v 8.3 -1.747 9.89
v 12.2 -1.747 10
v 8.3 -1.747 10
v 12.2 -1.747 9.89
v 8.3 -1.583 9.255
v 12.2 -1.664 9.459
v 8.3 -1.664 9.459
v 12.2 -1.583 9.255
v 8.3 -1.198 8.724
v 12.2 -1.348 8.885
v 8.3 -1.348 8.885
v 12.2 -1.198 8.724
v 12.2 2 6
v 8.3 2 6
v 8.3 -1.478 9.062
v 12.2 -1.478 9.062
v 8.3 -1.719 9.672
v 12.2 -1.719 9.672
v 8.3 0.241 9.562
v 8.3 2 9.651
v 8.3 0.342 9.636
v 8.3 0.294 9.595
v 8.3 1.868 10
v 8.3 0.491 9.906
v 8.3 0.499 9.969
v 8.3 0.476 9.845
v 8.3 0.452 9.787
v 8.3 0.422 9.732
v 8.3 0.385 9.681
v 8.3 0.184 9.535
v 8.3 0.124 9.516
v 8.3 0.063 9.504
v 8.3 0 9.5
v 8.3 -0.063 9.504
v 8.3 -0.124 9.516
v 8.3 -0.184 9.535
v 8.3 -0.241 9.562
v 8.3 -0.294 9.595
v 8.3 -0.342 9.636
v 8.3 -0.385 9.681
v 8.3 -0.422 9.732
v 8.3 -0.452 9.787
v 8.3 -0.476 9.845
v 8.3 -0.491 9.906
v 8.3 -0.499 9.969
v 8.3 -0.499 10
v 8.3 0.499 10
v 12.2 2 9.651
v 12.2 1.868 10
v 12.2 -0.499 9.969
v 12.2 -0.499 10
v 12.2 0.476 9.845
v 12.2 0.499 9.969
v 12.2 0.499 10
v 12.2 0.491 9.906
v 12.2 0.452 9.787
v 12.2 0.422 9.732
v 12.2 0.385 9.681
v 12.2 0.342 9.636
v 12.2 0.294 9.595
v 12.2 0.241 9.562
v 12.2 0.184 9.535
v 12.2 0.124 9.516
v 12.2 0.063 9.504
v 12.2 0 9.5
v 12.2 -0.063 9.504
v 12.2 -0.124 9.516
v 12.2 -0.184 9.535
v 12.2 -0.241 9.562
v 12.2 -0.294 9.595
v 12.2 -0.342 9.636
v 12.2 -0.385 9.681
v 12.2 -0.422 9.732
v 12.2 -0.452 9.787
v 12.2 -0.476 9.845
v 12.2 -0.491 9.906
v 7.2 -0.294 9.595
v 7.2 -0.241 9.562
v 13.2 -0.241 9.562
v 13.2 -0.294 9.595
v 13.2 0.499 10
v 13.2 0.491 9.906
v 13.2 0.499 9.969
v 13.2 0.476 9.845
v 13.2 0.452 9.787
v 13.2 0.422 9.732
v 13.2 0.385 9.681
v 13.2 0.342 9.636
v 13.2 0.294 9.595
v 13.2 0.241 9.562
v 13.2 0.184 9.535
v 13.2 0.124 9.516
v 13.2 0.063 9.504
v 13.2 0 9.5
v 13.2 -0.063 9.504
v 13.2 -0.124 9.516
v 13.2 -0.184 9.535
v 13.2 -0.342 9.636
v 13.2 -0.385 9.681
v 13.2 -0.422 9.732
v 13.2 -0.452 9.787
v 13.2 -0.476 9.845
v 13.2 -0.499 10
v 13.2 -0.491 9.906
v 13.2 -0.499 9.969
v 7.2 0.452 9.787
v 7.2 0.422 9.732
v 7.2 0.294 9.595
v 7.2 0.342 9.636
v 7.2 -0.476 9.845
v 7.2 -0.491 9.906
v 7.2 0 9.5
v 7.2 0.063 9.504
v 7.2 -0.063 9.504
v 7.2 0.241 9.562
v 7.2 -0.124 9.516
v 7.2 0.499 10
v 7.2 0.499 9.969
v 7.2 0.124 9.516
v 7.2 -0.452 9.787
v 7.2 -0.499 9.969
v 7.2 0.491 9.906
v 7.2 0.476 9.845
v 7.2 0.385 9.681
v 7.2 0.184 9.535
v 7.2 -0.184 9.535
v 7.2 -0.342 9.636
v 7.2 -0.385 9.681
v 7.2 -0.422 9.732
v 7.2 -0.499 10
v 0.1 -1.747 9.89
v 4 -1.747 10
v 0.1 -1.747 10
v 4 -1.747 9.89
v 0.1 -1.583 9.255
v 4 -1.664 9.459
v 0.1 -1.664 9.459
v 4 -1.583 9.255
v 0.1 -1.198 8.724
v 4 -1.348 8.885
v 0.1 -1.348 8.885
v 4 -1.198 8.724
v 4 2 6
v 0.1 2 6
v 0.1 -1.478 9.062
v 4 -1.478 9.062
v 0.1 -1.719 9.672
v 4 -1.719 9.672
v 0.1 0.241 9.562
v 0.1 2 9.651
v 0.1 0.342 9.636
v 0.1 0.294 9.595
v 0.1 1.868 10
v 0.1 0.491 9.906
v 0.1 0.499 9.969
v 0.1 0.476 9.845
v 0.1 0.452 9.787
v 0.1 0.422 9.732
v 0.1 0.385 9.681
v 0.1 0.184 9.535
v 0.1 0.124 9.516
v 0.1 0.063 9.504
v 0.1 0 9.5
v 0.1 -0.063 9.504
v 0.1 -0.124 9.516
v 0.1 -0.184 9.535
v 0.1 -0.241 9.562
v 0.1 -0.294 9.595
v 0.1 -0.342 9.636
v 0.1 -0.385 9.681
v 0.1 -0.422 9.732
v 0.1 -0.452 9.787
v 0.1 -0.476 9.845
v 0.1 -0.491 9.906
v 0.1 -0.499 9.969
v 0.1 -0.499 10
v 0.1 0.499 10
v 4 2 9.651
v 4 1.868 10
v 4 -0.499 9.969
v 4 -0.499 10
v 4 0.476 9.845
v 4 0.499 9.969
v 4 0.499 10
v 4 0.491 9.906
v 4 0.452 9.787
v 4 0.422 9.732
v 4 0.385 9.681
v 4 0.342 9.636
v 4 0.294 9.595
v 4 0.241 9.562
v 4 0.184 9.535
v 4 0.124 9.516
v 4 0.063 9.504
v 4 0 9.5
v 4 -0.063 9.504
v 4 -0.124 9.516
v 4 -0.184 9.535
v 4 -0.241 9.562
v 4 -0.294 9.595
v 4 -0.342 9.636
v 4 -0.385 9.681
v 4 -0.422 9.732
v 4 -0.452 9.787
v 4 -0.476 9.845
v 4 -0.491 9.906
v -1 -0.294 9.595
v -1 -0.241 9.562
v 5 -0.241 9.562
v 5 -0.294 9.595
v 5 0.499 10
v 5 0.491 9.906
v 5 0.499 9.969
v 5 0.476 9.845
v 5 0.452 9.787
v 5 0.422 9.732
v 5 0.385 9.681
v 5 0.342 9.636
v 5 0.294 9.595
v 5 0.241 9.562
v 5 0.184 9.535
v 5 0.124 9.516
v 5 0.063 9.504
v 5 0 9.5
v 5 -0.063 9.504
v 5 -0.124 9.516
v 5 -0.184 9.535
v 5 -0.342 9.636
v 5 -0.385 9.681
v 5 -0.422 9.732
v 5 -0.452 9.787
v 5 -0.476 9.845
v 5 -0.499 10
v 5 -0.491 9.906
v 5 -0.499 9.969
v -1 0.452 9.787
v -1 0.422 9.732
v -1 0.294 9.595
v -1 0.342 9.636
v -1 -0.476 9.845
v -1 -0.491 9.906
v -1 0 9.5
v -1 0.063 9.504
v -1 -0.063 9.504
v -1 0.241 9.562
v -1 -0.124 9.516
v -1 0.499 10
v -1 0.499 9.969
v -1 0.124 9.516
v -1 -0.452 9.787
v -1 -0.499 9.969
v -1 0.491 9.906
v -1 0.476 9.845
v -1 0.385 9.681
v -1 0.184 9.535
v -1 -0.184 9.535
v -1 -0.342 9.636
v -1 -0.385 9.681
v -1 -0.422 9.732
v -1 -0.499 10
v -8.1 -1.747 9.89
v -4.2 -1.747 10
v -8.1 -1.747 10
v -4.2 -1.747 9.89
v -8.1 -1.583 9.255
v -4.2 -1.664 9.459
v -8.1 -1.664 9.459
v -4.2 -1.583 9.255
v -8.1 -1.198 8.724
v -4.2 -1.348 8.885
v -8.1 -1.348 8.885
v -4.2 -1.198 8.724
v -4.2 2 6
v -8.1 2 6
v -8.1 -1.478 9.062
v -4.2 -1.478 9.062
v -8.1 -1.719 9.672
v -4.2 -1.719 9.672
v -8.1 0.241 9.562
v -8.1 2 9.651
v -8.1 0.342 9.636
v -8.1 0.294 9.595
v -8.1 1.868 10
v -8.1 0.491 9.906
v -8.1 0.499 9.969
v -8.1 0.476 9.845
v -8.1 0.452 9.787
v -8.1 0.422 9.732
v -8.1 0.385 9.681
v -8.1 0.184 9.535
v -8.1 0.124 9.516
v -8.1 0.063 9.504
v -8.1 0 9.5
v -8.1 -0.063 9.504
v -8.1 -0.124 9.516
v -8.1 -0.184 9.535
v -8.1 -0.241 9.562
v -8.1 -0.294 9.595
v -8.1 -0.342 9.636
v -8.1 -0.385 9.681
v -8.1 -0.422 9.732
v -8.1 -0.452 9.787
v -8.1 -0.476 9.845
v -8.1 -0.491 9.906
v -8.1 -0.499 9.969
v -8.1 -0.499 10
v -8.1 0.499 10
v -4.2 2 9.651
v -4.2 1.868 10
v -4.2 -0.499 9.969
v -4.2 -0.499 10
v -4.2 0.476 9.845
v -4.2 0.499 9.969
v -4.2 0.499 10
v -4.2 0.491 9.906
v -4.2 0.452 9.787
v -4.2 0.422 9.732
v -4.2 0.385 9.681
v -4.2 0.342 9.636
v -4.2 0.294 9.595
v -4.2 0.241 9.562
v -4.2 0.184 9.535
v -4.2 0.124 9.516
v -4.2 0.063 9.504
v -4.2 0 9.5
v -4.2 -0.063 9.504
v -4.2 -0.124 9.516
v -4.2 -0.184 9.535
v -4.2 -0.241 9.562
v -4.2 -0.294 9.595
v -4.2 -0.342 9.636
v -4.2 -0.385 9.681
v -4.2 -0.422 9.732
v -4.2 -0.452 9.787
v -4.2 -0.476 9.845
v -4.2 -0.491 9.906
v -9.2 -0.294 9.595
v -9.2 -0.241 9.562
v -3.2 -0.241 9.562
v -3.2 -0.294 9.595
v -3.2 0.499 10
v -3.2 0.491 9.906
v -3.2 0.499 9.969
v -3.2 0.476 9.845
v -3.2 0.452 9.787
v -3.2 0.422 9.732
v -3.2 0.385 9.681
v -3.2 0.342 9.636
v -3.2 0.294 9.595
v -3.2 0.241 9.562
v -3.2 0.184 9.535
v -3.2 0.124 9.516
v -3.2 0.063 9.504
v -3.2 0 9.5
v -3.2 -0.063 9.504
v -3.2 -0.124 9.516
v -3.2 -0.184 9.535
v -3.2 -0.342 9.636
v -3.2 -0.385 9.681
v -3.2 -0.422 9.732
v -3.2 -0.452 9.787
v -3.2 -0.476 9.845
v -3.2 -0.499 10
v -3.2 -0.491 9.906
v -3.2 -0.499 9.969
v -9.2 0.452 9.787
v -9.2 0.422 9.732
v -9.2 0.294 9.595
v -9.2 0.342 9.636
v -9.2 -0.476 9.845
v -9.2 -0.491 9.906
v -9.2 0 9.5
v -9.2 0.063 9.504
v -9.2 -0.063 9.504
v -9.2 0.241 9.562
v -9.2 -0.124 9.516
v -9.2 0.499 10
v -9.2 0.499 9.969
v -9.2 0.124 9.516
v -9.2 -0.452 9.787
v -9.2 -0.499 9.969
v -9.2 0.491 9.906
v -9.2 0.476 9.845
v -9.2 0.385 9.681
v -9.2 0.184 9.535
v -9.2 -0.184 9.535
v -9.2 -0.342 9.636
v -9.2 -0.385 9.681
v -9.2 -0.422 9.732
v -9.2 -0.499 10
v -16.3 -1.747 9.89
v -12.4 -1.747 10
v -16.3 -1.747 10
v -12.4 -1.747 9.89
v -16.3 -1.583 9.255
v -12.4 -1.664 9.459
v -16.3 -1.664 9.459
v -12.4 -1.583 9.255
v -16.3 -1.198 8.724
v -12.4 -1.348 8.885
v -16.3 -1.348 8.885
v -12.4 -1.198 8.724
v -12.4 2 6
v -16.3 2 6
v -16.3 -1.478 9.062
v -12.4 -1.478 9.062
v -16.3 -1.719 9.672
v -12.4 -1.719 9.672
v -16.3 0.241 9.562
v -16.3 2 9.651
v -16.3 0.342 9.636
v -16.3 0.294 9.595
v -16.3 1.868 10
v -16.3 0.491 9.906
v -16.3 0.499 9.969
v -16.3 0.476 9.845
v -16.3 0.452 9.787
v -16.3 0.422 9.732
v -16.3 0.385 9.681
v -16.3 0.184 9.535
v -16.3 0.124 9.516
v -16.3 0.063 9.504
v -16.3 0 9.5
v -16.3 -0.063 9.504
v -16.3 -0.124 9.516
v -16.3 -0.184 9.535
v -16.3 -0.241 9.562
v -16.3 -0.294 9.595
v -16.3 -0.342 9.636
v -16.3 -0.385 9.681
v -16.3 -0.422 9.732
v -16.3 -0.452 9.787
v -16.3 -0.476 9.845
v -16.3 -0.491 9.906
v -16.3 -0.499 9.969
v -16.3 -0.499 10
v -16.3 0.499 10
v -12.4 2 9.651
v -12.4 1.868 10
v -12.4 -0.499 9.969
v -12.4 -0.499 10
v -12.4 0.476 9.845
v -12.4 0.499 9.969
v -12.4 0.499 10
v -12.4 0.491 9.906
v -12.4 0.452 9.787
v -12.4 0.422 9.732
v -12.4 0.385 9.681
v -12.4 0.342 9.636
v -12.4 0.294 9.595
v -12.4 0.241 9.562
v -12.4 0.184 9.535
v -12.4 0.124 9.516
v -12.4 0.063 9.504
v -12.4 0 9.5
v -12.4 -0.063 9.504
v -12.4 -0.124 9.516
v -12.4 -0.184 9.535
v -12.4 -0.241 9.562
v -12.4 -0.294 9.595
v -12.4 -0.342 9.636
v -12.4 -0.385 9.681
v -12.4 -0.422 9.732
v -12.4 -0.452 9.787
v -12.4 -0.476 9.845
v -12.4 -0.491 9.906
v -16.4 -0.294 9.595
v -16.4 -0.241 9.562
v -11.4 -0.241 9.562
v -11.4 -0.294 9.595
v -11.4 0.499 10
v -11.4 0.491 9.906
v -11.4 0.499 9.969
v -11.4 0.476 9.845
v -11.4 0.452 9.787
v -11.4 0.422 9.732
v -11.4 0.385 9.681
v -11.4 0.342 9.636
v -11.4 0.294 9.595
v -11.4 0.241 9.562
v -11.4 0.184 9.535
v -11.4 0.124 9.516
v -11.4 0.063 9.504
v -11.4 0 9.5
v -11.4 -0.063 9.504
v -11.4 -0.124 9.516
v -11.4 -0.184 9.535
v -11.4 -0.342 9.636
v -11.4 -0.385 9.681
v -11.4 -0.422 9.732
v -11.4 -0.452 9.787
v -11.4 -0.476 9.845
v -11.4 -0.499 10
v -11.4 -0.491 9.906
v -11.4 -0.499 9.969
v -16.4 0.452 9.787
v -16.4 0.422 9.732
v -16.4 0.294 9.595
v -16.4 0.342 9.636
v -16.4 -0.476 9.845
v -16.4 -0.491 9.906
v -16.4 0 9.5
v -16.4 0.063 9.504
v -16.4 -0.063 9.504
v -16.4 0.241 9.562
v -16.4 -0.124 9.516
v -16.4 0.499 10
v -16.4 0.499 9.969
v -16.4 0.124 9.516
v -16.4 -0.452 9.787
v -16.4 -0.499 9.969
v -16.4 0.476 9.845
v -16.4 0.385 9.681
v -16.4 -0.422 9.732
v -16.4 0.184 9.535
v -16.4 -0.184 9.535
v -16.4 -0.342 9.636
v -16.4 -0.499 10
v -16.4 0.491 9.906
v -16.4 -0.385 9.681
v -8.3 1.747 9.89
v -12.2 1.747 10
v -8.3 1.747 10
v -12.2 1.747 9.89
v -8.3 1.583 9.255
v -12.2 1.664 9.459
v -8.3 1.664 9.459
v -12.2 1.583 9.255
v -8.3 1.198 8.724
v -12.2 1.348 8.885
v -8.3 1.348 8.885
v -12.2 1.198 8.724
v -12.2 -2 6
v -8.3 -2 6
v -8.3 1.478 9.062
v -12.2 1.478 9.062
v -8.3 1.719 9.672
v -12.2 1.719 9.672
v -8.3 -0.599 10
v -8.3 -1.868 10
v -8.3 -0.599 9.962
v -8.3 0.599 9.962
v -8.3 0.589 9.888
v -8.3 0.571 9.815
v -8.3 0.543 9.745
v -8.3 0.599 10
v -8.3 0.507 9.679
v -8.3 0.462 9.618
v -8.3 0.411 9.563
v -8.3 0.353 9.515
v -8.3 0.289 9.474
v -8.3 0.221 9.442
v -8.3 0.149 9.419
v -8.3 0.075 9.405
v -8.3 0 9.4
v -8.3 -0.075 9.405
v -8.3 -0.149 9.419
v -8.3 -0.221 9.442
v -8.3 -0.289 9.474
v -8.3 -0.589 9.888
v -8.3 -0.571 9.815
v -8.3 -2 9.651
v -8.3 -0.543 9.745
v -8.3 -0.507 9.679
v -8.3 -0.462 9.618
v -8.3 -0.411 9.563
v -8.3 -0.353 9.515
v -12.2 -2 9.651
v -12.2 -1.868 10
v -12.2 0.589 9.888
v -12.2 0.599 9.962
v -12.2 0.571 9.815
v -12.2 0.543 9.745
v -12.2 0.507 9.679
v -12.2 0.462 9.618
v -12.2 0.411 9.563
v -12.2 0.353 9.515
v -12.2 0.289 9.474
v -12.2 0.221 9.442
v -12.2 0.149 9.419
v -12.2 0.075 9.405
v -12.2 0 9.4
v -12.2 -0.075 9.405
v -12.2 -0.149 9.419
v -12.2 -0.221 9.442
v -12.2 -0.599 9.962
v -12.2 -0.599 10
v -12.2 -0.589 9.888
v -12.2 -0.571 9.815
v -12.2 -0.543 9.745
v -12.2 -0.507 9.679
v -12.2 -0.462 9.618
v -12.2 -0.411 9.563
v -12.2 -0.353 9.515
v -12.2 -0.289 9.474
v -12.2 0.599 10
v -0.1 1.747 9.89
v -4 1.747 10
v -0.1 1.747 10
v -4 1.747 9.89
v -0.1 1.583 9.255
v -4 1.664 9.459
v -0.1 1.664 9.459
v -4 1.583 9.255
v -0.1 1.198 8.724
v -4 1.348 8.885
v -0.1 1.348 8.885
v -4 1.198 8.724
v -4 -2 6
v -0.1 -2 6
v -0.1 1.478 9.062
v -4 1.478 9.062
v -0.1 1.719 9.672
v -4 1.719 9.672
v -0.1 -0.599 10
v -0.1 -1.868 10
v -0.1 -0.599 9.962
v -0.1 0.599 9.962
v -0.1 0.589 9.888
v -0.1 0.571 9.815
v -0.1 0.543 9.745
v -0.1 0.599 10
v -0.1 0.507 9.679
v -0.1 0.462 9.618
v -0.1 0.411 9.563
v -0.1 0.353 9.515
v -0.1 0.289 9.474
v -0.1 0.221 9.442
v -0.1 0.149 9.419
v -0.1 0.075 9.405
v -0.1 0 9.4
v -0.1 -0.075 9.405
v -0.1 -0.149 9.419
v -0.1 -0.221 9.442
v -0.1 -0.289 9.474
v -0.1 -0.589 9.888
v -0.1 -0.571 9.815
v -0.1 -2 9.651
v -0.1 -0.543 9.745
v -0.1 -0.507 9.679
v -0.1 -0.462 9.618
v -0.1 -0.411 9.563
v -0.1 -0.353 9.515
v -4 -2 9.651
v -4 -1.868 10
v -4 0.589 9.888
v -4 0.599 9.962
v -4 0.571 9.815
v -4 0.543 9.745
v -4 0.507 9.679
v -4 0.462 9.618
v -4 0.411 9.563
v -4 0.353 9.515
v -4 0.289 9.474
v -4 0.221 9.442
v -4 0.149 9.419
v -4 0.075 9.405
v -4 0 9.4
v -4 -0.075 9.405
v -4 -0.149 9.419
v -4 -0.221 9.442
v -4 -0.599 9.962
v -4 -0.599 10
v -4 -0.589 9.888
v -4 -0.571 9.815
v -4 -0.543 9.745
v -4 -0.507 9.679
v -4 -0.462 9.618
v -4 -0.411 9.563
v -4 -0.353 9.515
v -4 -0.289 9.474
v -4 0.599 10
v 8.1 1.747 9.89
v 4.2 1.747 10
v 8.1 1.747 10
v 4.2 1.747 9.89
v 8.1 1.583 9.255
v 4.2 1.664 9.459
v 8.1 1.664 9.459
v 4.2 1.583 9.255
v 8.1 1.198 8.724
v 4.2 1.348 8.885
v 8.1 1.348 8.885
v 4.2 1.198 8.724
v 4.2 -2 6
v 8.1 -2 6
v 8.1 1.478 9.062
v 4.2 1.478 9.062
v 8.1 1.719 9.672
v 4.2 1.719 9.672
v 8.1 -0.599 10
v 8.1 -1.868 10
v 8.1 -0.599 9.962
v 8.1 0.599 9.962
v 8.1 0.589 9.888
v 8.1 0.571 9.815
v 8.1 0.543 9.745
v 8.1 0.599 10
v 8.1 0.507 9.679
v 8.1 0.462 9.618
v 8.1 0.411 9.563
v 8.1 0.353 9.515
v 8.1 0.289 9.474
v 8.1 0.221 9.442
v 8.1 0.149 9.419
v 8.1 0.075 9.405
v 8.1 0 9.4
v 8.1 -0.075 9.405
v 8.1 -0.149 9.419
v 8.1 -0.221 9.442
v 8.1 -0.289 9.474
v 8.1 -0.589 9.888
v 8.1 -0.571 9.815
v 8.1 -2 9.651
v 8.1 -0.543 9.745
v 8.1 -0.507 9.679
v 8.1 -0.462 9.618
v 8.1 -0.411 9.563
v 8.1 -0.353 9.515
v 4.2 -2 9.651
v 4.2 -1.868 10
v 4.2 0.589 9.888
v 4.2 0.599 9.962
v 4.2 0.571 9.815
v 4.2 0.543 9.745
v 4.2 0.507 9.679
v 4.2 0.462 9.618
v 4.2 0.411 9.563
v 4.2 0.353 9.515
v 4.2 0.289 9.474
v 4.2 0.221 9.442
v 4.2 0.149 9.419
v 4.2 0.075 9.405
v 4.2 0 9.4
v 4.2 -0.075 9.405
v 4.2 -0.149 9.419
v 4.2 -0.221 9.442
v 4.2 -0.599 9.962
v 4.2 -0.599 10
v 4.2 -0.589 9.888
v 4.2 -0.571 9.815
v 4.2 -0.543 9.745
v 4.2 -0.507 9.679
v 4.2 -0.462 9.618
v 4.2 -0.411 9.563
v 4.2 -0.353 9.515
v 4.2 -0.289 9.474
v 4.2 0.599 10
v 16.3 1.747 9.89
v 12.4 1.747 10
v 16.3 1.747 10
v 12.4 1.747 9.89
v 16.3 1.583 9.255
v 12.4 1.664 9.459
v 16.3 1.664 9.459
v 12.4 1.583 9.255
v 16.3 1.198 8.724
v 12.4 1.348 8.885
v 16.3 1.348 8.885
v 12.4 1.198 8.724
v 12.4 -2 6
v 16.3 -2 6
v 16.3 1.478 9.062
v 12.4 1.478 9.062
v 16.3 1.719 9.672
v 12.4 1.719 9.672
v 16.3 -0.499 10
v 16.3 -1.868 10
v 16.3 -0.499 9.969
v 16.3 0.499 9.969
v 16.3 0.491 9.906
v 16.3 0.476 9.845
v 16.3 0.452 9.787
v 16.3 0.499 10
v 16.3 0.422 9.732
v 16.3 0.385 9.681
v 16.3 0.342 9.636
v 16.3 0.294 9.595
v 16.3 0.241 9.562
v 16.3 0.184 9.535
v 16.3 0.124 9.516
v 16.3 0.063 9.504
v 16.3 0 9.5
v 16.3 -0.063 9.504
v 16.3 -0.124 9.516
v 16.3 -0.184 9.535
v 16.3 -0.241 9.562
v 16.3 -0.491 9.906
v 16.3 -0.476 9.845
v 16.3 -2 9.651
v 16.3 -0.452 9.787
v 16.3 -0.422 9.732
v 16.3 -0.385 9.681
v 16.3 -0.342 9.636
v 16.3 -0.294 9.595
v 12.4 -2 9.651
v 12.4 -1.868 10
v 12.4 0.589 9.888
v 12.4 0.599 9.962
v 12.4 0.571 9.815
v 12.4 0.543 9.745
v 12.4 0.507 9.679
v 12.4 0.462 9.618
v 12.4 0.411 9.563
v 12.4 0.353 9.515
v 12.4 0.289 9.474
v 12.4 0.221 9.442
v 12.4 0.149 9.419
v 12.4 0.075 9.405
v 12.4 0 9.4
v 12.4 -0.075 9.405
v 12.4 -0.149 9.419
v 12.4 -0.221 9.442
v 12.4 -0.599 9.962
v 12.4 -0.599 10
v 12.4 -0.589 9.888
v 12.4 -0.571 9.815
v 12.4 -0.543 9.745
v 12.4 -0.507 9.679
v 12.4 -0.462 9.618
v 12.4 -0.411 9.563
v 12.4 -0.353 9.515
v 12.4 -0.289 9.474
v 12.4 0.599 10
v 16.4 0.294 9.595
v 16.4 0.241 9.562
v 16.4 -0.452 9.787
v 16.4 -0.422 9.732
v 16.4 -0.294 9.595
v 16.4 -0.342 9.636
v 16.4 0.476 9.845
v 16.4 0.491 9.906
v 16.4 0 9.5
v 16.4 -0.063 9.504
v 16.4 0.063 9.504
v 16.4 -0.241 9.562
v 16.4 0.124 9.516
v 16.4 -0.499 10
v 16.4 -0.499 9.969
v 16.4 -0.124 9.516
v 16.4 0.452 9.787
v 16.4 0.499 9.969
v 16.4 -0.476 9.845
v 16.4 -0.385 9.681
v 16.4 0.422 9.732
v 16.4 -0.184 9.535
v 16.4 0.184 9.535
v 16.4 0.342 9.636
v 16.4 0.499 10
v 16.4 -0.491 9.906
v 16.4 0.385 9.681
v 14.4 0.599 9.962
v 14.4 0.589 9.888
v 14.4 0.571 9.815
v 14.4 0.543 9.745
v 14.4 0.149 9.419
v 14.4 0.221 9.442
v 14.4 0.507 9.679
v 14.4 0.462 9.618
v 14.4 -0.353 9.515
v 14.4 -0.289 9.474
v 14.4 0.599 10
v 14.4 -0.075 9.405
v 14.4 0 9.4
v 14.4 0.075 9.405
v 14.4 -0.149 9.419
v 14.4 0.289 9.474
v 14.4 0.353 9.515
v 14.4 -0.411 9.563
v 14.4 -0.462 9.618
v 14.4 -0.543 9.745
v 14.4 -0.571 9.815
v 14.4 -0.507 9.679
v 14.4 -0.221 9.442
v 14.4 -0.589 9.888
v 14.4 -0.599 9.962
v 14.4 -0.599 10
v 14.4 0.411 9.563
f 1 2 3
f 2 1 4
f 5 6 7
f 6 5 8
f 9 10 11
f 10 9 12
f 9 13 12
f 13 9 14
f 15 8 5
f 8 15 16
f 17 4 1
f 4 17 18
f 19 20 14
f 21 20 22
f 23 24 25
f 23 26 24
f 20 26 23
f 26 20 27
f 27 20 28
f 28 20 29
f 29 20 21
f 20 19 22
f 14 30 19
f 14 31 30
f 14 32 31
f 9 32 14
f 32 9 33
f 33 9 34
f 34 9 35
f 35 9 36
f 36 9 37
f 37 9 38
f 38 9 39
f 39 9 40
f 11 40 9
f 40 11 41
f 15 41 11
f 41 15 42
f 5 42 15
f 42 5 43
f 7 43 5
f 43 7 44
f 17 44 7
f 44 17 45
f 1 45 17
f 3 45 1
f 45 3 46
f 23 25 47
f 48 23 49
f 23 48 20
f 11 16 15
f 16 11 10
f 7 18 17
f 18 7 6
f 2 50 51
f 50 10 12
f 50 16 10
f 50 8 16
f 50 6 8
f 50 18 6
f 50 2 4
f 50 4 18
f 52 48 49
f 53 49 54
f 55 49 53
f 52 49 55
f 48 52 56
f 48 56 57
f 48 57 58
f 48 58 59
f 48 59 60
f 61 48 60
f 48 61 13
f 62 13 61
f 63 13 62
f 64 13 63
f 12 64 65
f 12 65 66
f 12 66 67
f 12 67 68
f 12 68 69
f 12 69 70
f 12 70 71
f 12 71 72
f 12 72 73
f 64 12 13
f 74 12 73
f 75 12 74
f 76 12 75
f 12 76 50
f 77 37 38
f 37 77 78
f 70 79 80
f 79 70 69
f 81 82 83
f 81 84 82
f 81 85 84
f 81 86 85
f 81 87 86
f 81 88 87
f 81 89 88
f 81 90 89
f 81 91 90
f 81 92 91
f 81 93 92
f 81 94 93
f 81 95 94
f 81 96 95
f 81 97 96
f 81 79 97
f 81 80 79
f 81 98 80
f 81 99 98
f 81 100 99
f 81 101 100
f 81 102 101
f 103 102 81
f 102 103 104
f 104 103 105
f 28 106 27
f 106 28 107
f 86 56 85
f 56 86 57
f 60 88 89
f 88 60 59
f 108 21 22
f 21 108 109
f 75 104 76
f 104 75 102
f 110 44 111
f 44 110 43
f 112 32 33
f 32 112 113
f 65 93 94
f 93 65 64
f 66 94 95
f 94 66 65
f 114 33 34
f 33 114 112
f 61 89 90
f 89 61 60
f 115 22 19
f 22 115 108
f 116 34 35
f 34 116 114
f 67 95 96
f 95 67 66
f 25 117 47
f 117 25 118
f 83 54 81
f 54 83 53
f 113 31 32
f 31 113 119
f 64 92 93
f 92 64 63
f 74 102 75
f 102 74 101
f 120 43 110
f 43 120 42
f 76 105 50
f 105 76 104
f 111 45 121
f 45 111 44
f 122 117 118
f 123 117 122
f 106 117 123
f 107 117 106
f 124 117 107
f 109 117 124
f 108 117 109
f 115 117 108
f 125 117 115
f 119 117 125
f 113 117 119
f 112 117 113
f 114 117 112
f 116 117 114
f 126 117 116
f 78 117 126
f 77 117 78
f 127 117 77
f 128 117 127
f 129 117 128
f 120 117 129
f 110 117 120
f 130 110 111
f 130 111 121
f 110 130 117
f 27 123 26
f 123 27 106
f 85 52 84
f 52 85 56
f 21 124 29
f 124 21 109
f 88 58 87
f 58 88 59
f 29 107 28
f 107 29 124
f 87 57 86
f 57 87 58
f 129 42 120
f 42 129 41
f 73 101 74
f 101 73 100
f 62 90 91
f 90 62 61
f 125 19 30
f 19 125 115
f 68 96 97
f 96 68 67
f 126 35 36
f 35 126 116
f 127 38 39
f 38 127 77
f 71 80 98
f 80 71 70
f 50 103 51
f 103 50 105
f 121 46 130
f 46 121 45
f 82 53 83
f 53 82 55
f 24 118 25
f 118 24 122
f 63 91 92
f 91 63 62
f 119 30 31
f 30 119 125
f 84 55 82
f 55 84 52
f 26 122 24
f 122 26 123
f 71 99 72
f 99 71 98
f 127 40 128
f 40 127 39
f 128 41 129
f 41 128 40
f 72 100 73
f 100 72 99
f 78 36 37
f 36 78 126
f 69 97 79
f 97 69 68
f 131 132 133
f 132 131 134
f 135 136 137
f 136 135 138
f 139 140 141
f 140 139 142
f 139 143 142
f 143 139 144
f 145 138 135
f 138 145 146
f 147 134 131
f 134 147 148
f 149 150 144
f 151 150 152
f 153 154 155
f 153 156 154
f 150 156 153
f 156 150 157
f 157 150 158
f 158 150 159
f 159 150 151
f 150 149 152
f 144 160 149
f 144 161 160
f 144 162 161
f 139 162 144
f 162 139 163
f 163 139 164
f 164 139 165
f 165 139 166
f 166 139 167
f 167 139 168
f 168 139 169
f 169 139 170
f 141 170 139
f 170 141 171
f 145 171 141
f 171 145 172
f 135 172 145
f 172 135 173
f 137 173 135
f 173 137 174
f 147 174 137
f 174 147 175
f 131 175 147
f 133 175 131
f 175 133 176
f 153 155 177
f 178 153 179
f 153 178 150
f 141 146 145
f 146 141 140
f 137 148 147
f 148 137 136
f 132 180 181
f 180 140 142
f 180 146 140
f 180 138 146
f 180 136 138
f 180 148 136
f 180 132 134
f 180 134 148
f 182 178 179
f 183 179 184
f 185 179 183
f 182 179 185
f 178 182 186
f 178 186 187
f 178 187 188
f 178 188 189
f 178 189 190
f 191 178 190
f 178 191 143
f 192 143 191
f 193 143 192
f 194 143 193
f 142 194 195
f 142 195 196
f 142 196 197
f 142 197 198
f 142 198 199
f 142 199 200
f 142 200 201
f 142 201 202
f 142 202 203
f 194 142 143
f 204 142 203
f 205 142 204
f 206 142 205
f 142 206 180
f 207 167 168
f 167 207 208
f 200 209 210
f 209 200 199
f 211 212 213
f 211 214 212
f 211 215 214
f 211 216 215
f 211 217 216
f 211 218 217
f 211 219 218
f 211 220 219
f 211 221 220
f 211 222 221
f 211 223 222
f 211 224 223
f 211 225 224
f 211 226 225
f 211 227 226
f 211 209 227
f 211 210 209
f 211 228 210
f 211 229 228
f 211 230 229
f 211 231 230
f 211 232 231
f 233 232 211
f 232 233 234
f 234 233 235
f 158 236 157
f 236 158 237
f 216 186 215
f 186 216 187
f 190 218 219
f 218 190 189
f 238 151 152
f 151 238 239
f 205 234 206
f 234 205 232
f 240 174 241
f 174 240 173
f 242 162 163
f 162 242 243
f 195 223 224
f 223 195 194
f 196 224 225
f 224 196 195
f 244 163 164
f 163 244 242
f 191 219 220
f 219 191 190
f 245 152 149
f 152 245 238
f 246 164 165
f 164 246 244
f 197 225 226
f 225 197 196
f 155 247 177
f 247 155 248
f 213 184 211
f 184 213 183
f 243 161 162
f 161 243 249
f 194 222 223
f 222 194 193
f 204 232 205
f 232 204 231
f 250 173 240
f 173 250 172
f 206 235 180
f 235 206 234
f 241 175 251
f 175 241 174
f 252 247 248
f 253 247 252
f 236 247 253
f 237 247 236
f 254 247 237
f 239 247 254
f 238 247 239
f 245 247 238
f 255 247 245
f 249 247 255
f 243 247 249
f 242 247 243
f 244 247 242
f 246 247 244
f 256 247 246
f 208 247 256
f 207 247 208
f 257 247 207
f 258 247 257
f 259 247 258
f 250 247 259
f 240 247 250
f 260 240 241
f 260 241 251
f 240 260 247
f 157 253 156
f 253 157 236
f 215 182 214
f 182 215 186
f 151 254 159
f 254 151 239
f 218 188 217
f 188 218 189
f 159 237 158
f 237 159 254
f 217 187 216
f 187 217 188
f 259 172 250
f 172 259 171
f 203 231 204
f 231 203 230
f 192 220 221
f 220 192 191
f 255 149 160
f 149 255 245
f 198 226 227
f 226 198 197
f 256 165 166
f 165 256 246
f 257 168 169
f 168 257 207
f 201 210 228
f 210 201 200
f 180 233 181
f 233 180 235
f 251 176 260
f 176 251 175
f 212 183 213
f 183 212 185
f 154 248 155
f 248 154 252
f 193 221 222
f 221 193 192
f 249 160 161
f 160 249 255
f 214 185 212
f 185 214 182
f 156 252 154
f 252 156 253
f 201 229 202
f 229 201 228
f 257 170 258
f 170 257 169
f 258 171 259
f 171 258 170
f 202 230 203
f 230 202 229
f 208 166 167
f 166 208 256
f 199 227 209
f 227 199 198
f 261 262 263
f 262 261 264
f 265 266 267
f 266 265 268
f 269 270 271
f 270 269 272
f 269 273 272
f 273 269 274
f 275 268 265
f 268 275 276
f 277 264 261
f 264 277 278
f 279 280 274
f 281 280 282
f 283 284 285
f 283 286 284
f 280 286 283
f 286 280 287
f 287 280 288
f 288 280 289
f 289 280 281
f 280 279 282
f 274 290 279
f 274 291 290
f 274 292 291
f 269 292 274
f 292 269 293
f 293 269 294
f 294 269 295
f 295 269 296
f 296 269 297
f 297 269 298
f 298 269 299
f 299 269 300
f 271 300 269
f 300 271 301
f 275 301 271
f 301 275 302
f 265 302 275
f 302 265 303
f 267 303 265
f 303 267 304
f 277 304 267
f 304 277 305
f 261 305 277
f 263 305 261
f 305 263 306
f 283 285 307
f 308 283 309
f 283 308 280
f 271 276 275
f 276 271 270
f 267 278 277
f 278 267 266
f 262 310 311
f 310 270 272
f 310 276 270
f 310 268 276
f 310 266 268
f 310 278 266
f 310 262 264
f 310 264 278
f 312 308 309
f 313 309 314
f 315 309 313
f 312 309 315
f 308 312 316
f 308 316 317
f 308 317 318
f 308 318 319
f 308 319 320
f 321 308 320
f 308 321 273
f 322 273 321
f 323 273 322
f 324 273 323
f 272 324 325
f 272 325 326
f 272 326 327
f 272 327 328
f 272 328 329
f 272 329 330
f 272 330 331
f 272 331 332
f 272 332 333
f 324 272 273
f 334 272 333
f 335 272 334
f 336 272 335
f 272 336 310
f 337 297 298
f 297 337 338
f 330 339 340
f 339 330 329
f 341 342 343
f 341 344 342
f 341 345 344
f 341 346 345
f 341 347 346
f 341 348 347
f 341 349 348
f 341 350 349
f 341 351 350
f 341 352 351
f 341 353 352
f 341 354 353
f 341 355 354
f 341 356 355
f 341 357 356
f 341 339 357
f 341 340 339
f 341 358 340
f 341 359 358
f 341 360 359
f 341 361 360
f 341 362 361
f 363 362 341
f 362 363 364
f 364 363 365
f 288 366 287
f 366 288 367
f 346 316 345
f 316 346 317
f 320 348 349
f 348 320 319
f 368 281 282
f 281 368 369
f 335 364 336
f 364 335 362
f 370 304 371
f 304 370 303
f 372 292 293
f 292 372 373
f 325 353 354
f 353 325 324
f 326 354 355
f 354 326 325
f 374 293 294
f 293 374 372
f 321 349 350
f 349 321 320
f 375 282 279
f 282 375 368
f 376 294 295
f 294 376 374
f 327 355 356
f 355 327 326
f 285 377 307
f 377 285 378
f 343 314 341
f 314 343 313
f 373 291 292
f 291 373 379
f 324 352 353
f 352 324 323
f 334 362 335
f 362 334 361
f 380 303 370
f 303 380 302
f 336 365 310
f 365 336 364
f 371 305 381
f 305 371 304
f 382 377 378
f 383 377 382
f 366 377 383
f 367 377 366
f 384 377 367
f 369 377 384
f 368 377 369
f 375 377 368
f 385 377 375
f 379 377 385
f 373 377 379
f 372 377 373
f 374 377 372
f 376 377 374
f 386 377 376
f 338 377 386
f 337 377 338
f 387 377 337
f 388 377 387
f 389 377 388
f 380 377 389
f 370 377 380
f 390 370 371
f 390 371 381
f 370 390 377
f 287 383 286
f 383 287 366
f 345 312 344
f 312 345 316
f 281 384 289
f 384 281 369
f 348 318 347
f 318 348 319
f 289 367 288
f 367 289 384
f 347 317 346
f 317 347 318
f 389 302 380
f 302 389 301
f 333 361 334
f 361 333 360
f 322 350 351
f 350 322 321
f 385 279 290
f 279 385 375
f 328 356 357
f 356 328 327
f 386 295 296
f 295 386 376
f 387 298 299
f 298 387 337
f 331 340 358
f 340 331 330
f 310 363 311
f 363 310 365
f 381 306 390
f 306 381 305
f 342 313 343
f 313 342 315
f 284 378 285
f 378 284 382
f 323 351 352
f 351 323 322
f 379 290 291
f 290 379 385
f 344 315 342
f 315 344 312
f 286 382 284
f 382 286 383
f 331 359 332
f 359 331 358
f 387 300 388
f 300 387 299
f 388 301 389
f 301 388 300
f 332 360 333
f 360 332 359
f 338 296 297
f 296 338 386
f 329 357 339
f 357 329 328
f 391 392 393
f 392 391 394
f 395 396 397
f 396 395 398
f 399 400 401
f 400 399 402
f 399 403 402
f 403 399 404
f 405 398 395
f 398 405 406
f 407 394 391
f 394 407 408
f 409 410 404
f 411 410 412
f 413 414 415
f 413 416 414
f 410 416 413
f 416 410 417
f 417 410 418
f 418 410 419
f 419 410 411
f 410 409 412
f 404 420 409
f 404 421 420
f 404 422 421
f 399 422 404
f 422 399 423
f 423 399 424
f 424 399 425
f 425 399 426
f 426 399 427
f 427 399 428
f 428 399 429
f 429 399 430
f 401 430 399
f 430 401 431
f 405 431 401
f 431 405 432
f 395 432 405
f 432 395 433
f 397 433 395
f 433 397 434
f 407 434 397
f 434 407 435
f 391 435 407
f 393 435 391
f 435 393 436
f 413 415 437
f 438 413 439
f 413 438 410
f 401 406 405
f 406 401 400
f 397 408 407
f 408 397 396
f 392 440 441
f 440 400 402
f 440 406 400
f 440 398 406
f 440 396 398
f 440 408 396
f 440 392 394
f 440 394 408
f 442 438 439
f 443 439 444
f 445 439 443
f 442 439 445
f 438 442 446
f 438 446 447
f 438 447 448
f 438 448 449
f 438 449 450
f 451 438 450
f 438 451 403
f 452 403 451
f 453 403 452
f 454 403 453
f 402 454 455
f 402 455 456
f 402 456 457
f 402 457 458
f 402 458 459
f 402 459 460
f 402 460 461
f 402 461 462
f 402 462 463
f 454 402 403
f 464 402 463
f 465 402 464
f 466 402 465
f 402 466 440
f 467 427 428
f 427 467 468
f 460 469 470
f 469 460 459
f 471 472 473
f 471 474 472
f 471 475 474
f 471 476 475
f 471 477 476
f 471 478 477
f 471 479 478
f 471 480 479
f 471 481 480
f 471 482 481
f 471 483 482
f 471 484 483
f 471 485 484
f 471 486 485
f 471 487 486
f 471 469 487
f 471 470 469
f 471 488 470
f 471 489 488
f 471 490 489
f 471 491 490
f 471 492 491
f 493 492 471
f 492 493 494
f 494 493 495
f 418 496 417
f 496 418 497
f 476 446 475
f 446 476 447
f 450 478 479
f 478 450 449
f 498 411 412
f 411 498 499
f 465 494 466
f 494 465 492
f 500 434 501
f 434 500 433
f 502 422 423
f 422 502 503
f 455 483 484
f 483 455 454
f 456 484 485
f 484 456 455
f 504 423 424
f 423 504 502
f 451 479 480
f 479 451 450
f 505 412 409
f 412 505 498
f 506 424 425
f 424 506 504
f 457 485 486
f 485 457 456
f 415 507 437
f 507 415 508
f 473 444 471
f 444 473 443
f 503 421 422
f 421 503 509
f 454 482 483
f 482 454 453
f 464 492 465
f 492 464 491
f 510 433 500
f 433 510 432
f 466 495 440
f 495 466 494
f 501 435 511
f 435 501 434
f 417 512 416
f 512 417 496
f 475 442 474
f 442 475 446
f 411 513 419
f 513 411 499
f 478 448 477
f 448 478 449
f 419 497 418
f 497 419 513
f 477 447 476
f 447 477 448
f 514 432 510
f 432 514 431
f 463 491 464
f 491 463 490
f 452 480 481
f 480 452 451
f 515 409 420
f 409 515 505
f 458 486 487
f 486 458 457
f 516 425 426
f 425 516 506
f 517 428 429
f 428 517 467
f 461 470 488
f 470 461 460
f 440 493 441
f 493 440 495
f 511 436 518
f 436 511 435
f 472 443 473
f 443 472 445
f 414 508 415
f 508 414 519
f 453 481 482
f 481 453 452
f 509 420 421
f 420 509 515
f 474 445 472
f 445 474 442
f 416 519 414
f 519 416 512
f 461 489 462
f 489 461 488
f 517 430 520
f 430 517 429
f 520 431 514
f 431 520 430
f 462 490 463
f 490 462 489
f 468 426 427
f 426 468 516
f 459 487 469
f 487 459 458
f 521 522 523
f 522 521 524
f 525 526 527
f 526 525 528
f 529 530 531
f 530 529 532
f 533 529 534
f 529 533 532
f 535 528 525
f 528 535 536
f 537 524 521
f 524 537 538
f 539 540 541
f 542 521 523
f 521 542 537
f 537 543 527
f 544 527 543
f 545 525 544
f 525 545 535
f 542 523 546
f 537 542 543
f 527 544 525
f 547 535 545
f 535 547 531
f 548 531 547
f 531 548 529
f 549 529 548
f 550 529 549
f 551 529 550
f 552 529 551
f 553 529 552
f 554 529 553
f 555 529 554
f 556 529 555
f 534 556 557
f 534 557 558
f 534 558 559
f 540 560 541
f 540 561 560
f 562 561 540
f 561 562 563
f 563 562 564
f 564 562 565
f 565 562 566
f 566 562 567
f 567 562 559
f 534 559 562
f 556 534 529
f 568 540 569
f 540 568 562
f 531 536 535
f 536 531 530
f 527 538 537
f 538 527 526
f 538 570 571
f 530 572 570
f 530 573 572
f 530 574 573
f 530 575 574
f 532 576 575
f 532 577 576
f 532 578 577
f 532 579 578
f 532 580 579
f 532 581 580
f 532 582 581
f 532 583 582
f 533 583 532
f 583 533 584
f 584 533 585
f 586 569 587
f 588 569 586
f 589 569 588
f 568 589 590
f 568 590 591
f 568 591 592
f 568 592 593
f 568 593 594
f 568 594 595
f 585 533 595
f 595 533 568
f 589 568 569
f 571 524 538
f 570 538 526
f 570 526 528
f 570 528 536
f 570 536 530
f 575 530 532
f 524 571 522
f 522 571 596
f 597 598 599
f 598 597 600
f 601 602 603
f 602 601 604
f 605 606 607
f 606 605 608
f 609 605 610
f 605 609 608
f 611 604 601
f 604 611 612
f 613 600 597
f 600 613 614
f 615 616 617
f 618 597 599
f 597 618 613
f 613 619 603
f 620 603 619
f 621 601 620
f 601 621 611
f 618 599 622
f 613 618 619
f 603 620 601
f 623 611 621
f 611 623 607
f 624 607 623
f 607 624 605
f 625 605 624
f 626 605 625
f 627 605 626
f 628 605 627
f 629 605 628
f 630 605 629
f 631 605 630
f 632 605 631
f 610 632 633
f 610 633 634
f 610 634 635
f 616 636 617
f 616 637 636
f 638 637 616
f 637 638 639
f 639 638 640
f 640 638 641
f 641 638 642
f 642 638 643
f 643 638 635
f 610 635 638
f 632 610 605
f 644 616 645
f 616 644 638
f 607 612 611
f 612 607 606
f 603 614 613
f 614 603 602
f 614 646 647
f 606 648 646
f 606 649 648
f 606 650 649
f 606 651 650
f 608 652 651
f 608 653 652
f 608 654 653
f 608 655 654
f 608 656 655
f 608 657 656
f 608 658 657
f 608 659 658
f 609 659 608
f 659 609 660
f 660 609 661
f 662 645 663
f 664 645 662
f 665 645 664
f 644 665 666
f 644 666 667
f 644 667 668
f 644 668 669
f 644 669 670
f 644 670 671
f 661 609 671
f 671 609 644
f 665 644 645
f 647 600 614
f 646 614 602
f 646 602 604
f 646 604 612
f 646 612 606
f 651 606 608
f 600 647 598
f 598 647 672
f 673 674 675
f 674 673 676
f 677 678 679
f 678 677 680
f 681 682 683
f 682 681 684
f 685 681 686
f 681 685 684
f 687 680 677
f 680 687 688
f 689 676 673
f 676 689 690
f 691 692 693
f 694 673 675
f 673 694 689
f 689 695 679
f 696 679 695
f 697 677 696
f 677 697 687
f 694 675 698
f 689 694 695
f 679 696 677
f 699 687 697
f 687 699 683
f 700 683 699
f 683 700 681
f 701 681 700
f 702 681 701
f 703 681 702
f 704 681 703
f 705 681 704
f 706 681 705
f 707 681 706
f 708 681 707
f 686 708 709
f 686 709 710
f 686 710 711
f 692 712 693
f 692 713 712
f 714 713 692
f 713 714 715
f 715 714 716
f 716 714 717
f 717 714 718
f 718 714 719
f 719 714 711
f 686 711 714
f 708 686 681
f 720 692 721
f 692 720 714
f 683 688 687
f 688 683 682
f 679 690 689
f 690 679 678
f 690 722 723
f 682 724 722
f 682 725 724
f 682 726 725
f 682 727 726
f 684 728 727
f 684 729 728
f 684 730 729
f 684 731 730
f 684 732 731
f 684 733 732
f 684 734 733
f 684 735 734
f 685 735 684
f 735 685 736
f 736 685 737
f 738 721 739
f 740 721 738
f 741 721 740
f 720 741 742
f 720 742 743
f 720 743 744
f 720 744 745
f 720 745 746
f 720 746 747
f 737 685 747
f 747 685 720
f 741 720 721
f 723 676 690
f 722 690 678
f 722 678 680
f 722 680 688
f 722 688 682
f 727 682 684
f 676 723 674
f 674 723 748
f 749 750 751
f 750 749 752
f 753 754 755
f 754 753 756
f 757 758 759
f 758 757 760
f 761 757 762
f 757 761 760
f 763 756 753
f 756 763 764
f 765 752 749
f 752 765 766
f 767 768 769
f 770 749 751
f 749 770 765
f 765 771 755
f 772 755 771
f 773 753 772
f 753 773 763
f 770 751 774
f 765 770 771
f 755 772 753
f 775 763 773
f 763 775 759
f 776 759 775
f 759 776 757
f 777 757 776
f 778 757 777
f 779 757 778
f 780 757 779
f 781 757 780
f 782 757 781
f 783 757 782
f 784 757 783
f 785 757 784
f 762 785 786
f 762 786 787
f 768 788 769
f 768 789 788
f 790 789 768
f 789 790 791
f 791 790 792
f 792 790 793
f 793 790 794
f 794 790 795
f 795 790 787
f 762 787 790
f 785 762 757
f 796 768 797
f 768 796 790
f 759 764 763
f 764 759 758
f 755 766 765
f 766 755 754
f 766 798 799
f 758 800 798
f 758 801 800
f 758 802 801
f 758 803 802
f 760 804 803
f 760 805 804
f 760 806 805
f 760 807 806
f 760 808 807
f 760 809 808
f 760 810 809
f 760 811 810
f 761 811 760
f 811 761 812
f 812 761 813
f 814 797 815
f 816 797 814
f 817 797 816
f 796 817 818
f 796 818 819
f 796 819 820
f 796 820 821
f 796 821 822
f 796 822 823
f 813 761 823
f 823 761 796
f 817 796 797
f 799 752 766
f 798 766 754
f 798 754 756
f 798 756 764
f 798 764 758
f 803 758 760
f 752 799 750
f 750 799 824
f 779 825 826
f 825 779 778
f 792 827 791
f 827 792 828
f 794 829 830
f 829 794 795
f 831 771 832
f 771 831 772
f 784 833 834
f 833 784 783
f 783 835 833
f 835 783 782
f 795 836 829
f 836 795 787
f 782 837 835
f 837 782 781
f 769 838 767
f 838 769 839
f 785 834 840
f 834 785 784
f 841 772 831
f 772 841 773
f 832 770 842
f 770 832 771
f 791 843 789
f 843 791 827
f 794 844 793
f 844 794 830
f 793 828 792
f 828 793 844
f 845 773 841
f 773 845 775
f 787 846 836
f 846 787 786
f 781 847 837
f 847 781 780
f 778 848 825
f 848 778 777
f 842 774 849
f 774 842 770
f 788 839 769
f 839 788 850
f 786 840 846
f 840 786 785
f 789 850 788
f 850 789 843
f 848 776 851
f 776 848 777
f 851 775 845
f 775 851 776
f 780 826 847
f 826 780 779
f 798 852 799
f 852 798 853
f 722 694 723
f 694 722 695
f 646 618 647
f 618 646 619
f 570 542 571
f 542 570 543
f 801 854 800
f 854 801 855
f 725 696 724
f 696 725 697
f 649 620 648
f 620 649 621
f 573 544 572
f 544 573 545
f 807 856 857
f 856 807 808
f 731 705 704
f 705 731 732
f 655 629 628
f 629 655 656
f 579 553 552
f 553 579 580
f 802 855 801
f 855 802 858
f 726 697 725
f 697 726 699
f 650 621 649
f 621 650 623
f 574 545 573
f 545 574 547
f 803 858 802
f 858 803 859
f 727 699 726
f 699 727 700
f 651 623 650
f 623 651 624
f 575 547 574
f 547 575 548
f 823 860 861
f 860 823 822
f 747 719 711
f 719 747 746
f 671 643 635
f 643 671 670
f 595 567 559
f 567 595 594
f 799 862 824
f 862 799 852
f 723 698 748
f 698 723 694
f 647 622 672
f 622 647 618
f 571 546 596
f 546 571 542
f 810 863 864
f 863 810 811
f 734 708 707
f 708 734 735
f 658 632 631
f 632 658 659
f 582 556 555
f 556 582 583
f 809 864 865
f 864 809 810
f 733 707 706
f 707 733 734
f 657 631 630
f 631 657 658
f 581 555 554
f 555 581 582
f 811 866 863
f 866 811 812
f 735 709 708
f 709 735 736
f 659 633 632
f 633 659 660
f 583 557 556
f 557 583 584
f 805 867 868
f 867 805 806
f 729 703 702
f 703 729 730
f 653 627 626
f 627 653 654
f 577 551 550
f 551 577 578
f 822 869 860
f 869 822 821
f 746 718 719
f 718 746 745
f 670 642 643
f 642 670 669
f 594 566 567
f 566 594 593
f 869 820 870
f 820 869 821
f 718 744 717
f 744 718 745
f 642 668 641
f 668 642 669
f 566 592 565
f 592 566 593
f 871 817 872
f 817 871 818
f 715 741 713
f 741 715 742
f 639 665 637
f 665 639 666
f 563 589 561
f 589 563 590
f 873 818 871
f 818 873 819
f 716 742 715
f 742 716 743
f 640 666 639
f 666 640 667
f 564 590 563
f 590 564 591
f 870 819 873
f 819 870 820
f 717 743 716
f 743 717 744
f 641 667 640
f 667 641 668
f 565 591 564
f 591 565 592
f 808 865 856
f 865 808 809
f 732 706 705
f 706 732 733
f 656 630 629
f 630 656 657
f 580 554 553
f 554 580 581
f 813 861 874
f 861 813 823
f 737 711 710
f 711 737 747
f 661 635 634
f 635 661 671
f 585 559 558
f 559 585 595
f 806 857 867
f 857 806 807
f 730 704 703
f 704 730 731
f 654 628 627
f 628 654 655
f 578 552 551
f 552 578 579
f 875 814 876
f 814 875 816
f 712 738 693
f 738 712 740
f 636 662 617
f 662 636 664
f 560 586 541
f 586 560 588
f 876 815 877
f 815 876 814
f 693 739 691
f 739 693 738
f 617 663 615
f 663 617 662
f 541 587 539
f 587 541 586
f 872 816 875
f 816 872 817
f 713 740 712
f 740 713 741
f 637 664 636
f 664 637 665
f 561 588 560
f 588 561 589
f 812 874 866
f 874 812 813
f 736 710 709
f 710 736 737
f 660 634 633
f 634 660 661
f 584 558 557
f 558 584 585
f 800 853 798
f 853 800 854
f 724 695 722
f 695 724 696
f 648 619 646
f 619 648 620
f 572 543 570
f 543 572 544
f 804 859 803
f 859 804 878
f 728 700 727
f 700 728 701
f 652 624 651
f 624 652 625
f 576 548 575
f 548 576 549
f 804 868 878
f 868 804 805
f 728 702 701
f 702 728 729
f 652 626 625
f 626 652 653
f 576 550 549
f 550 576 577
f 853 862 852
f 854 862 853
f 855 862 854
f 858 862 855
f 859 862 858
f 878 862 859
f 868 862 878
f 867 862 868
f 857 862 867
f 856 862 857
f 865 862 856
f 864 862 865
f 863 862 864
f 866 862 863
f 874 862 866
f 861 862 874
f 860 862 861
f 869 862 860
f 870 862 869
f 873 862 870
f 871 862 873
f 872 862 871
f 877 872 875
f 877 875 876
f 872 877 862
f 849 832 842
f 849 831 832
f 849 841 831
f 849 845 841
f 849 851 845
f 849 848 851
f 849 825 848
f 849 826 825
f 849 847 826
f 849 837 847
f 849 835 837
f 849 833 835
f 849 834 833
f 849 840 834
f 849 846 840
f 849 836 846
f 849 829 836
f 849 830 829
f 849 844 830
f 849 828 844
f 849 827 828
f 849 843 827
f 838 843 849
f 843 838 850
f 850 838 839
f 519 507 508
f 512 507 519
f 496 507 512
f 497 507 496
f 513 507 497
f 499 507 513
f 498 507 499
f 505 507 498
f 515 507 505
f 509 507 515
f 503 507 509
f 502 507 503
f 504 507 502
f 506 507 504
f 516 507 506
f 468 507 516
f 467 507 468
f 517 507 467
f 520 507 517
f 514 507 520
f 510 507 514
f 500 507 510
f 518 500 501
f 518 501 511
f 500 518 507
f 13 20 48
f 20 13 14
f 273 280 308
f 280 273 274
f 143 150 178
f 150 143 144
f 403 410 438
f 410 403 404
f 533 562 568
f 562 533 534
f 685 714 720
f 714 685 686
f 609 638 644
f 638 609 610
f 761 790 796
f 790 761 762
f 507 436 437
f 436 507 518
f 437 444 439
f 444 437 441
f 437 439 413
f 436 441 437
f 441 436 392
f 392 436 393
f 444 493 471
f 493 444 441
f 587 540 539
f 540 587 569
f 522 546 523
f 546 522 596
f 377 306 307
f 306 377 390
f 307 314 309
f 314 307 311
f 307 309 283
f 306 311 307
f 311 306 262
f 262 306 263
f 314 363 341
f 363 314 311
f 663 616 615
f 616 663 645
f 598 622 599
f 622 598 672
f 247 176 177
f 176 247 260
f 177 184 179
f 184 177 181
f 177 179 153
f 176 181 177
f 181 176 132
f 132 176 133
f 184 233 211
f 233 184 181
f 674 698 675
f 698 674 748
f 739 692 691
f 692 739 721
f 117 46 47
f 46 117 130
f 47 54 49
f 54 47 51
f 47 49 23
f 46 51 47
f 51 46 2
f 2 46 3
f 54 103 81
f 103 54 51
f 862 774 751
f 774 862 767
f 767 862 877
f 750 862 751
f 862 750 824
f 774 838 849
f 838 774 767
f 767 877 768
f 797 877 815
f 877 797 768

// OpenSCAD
/*
  author: Christopher O'Brien <obriencj@gmail.com>
  license: GPL v3
*/


module hinge_join(width, height, standoff, count, pin=0.5, $fn=50) {

     gap = 0.1;

     // this is the bore of the hinge barrels, based on the pin size
     // plus a tiny bit extra
     pin_gap = pin + gap;

     overall = (width + gap) * count * 2;

     intersection() {
	  translate([overall / -2, -standoff, 0]) {
	       cube([overall, standoff * 2, height * 2]);
	  }

	  union() {
	       // half the hinges are normal, and include their pins
	       children();

	       // the other half of the hinges have a hole removed that
	       // is meant to accept the pin
	       rotate([0, 0, 180]) {
		    difference() {
			 children();
			 translate([(overall / -2) + (width / 2), 0, height]) {
			      rotate([0, 90, 0]) {
				   cylinder(overall - width, pin_gap, pin_gap);
			      };
			 };
		    };
	       };
	  };
     };
}


module hinge_half(width, height, standoff, count=2, pin=0.5, $fn=50) {

     // the gap is the space between the barrels, preventing them from
     // merging into a single solid object
     gap = 0.1;

     gwid = width - gap;

     locate = -(width + gap) * 2;

     barrel_r = standoff - 0.25;

     start = ceil(count / -2) + 1;
     stop = floor(count / 2);

     for(c = [start:stop]) {
	  translate([locate * c, 0, 0]) {
	       union() {
		    // is is the body of the barrel and a slanted
		    // segment that joins to the opposing parts
		    hull() {
			 translate([gap, 0, height]) {
			      rotate([0, 90, 0]) {
				   cylinder(gwid, barrel_r, barrel_r);
			      };
			 };
			 translate([gap, standoff, height - 4]) {
			      cube([gwid, 1, 1]);
			 };
		    };

		    // this is the connecting pin, driven through the
		    // whole hing, and subtracted later from half of
		    // the hinges during hinge_join
		    translate([-1, 0, height]) {
			 rotate([0, 90, 0]) {
			      cylinder(width + 2, pin, pin);
			 };
		    };
	       };
	  };
     };
}



module hinges(barrel_width=4, center_height=8,
	      standoff=2, count=4, pin_r=0.5) {

     hinge_join(barrel_width, center_height, standoff, count, pin_r) {
	  hinge_half(barrel_width, center_height, standoff, count, pin_r);
     };
}


intersection() {
     hinges(4, 10, 2, 4);

     translate([-50, -50, 0])
     cube([100, 100, 10]);
};


// The end.
